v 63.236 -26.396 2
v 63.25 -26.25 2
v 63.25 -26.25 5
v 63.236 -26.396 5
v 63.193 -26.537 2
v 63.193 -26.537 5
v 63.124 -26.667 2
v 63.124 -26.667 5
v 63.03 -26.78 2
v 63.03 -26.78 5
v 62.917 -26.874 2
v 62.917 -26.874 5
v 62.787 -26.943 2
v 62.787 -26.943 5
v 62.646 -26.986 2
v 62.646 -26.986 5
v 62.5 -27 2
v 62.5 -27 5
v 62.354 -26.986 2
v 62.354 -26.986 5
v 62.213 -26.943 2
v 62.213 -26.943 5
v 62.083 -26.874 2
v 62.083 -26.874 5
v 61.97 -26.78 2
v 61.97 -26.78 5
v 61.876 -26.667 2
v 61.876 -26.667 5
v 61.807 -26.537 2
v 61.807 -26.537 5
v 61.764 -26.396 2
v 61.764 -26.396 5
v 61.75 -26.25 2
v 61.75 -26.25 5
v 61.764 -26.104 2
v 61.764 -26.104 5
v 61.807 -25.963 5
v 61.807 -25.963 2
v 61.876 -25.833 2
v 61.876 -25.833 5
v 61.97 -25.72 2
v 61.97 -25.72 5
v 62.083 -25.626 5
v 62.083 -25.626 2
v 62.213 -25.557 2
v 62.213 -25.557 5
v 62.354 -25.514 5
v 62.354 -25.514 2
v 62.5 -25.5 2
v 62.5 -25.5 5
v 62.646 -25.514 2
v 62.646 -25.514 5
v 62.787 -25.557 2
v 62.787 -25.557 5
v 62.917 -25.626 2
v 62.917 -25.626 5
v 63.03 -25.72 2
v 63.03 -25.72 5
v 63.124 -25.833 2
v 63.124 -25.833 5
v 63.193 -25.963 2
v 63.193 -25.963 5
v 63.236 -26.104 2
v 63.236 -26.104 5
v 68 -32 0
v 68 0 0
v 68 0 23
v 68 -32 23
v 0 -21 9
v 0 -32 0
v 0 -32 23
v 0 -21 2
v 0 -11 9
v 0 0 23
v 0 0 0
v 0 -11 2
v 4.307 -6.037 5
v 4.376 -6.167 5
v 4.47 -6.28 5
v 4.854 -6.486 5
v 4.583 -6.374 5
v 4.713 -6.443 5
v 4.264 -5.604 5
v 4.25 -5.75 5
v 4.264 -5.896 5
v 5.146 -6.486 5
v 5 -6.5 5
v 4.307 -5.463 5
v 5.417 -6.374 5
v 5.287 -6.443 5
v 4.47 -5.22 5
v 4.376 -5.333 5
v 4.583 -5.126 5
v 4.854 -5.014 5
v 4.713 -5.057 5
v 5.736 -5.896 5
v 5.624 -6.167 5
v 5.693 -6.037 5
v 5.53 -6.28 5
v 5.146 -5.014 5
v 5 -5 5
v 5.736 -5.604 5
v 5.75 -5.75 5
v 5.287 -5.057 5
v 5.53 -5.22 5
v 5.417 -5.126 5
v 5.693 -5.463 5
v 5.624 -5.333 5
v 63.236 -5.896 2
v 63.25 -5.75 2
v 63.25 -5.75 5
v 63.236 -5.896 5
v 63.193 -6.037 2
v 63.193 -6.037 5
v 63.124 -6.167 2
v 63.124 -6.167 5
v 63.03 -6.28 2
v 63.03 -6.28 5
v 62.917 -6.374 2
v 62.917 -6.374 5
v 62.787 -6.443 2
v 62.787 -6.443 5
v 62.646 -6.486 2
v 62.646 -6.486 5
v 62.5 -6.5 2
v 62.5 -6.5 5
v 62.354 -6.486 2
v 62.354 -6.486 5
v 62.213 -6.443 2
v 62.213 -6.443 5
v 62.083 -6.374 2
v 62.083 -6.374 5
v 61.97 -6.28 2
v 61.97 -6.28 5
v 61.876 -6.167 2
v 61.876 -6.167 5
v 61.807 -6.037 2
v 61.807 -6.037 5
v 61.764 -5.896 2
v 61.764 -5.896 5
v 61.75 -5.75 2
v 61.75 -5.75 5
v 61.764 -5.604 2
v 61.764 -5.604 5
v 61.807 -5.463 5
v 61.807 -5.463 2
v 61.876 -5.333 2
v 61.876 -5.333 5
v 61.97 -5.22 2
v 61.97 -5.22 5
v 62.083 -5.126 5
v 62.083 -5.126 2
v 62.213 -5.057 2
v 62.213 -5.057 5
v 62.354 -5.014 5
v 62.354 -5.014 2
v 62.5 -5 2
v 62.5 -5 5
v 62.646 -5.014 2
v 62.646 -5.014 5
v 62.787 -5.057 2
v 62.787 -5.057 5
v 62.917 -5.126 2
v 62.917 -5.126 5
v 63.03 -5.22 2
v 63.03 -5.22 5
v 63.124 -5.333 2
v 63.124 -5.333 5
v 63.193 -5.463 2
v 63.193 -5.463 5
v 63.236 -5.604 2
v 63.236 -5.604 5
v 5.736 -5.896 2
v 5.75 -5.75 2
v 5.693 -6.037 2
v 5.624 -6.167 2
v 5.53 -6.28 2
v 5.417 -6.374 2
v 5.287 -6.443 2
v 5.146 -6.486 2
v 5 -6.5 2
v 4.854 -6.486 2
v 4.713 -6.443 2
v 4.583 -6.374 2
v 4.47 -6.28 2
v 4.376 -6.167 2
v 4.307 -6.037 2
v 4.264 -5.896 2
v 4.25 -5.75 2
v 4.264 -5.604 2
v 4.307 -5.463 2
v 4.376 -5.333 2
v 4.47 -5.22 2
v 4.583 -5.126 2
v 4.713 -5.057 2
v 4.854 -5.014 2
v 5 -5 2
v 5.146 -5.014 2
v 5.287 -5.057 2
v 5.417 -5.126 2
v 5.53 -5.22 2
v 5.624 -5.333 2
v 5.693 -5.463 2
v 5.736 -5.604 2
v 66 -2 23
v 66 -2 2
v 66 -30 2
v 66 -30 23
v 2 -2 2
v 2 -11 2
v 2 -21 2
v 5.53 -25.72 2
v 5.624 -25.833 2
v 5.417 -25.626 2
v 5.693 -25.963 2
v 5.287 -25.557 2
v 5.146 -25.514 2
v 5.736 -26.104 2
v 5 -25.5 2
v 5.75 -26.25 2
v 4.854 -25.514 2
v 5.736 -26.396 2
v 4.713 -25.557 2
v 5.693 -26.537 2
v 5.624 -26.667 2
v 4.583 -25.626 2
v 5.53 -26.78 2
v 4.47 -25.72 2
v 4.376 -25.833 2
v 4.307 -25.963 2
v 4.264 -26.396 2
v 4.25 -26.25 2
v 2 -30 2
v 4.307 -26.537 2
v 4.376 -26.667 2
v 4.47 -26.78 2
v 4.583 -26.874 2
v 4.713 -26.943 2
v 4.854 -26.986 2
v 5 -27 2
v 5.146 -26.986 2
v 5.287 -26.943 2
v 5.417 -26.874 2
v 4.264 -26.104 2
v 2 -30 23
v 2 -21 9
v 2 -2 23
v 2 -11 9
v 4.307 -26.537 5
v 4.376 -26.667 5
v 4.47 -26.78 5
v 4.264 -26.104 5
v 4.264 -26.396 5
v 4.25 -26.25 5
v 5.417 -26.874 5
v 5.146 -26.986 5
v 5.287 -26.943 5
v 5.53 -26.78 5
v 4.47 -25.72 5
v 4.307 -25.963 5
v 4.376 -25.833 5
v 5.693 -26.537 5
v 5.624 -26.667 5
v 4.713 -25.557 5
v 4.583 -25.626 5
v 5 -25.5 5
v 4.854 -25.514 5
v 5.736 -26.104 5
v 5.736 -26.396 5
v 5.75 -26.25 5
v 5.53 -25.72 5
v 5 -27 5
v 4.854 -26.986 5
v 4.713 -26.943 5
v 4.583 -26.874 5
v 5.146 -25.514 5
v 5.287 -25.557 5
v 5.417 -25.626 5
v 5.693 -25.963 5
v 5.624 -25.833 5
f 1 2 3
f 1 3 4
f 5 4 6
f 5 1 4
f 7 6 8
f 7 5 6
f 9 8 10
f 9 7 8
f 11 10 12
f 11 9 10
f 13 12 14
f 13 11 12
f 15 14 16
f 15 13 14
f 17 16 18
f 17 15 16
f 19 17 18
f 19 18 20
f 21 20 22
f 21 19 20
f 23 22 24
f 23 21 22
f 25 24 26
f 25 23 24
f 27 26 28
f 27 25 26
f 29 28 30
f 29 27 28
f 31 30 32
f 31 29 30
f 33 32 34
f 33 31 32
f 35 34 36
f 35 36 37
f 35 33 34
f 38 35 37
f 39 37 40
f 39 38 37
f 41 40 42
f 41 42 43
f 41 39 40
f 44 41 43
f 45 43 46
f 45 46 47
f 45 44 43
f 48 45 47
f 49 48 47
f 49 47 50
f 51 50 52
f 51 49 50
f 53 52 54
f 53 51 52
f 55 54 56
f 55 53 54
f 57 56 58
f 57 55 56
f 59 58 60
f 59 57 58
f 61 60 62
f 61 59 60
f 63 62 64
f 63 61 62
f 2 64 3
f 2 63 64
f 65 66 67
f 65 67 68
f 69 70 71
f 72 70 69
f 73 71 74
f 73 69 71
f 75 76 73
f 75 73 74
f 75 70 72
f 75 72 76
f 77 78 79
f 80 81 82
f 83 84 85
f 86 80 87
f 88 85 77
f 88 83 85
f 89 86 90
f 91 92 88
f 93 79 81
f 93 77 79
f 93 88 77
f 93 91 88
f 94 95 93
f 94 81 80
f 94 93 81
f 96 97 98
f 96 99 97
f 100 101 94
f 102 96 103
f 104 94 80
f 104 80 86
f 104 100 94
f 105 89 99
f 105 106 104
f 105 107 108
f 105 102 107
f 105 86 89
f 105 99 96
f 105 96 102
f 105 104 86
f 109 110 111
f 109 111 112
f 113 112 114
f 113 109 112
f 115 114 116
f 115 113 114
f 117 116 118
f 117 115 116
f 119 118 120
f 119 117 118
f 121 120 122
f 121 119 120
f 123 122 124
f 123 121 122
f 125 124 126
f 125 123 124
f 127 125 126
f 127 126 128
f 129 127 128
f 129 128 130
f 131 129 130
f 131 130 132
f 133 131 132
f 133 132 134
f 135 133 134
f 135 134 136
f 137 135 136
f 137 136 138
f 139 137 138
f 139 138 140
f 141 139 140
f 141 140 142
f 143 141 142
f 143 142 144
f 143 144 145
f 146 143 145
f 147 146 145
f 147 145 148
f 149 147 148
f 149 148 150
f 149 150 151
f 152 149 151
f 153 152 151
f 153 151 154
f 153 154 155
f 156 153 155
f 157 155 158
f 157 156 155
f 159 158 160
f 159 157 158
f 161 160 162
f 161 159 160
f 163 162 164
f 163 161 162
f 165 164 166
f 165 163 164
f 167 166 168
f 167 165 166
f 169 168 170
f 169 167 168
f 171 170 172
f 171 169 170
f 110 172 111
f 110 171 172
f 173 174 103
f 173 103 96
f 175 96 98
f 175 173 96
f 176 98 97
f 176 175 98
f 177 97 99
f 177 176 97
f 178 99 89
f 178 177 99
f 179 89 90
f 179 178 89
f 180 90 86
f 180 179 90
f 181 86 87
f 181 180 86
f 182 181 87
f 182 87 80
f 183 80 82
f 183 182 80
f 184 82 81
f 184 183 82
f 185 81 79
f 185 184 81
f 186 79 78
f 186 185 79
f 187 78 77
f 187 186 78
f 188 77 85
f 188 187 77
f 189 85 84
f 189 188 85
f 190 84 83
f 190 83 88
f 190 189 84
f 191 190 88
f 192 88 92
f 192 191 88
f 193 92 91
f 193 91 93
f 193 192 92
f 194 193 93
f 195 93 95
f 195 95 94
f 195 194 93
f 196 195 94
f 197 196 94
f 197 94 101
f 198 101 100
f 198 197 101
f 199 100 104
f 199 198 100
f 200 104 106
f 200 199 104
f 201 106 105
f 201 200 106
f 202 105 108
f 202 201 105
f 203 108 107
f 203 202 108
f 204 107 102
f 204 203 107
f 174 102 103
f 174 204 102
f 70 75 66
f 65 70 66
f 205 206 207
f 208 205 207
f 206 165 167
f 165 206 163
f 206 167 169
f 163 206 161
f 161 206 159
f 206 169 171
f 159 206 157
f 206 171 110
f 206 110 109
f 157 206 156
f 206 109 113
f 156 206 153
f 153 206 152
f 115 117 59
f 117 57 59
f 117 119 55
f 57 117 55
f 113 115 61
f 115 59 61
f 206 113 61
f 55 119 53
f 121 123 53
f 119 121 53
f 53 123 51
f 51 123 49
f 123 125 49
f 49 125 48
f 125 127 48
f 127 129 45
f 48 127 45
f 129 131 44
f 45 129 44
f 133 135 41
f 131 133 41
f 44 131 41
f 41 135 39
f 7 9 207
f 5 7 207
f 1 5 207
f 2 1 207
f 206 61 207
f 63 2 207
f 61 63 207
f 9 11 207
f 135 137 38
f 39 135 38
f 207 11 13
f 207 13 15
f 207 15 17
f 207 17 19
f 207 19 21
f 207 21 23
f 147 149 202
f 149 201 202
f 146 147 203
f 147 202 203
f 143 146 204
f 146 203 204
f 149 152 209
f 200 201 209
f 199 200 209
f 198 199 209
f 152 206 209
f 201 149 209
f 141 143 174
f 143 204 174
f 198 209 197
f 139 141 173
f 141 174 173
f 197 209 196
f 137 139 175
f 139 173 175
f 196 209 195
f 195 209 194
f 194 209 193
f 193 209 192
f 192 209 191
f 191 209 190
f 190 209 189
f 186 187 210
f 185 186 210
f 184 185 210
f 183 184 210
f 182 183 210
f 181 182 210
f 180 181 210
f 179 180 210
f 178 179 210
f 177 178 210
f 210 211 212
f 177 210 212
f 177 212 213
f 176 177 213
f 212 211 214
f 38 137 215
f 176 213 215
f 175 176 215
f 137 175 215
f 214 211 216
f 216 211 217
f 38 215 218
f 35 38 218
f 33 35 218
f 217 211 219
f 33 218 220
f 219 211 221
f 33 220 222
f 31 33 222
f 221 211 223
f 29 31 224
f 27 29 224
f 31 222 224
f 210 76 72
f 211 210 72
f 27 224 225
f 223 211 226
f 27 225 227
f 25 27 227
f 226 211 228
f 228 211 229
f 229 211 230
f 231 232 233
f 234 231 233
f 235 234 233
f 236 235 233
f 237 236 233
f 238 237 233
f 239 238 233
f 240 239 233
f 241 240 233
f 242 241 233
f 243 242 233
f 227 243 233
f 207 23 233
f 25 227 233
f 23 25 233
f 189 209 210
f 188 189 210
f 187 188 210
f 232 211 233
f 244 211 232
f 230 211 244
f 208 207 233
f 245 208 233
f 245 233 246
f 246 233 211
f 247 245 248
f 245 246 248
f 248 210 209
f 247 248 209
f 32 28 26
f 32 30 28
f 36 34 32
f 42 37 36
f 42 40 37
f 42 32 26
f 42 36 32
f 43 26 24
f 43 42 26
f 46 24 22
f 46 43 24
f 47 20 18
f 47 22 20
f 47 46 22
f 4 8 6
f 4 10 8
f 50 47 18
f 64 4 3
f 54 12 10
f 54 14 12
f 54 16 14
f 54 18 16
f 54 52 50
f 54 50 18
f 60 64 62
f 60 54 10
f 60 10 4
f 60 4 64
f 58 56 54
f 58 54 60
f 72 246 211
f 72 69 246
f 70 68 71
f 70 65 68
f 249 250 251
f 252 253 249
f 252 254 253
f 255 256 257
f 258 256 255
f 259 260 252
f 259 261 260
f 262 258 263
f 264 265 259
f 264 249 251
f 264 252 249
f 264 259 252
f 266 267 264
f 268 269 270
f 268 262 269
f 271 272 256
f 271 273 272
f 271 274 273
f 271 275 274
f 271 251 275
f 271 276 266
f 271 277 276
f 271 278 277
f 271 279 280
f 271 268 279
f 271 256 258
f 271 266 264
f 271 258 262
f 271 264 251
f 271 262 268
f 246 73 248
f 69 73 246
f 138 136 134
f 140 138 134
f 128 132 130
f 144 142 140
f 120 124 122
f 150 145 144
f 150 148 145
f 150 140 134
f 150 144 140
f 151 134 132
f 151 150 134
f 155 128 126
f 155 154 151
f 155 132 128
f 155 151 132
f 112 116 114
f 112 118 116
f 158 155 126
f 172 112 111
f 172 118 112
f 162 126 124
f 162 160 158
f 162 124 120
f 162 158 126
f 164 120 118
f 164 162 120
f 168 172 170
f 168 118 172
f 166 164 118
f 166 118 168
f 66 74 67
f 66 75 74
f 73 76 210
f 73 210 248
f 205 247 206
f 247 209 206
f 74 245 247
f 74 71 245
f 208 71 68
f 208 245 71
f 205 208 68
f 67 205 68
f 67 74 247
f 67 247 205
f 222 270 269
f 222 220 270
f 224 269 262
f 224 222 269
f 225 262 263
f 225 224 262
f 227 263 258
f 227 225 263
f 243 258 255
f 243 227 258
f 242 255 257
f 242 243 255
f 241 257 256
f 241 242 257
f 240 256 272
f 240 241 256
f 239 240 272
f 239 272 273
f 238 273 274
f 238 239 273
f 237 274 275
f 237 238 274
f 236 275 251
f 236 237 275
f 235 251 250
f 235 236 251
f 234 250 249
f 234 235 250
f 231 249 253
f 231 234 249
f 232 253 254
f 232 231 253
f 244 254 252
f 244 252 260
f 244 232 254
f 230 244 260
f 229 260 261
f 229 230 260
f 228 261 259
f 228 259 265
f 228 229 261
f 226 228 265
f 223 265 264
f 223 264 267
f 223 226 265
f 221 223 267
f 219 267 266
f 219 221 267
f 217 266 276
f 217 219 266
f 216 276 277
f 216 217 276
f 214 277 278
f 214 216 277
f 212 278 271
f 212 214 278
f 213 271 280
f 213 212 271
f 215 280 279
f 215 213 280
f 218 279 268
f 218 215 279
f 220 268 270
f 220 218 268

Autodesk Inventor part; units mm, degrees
ref_plane "YZ Plane" through (0, 0, 0) normal (1, 0, 0) x (0, 1, 0)
ref_plane "XZ Plane" through (0, 0, 0) normal (0, 1, 0) x (-1, 0, 0)
ref_plane "XY Plane" through (0, 0, 0) normal (0, 0, 1) x (1, 0, 0)
sketch "Sketch1" plane through (0, 0, 0) normal (0, 0, 1) x (1, 0, 0)
  line L0 (0, 0) -> (68, 0)
  line L1 (68, 0) -> (68, -32)
  line L2 (68, -32) -> (0, -32)
  line L3 (0, -32) -> (0, 0)
  dimension "d0" = 68
  dimension "d1" = 32
extrude "Extrusion1" add sketch "Sketch1" along normal blind 23
shell "Shell1" thickness 2 removed faces 1 at (22.6667, -10.6667, 23)
sketch "Sketch5" plane through (2, -30, 2) normal (0, 0, 1) x (1, 0, 0)
  line L0 (-2, 30) -> (3, 30)
  line L1 (66, 30) -> (-2, 30) projected
  line L2 (3, 30) -> (3, 14)
  line L3 (3, 14) -> (3, 24.25)
  line L4 (3, 24.25) -> (60.5, 24.25)
  line L5 (60.5, 24.25) -> (60.5, 3.75)
  line L6 (60.5, 3.75) -> (3, 3.75)
  line L7 (3, 3.75) -> (3, 14)
  circle A0 centre (60.5, 24.25) radius 0.75
  circle A1 centre (60.5, 3.75) radius 0.75
  circle A2 centre (3, 24.25) radius 0.75
  circle A3 centre (3, 3.75) radius 0.75
  dimension "d5" = 5
  dimension "d6" = 16
  dimension "d7" = 10.25
  dimension "d8" = 57.5
  dimension "d9" = 20.5
  dimension "d10" = 1.5
  dimension "d11" = 1.5
  dimension "d12" = 1.5
  dimension "d13" = 1.5
extrude "Extrusion2" add sketch "Sketch5" along normal blind 3 contours A2 L4 L2 | L2 A2 | L4 A2 L2 | A0 L5 L4 | L4 L5 A0 | A3 L6 L7 | L7 L6 A3 | A1 L6 L5 | L5 L6 A1
sketch "Sketch6" plane through (0, -32, 0) normal (-1, 0, 0) x (0, 0, 1)
  line L0 (2, 30) -> (2, 2) projected
  line L1 (2, 16) -> (2, 21)
  line L2 (2, 21) -> (9, 21)
  line L3 (9, 21) -> (9, 11)
  line L4 (9, 11) -> (2, 11)
  line L5 (2, 11) -> (2, 16)
  point P0 (0, 32)
  point P1 (2, 11)
  dimension "d16" = 5
  dimension "d17" = 7
  dimension "d18" = 10
extrude "Extrusion3" cut sketch "Sketch6" against normal blind 10
properties part number "laatikko"
